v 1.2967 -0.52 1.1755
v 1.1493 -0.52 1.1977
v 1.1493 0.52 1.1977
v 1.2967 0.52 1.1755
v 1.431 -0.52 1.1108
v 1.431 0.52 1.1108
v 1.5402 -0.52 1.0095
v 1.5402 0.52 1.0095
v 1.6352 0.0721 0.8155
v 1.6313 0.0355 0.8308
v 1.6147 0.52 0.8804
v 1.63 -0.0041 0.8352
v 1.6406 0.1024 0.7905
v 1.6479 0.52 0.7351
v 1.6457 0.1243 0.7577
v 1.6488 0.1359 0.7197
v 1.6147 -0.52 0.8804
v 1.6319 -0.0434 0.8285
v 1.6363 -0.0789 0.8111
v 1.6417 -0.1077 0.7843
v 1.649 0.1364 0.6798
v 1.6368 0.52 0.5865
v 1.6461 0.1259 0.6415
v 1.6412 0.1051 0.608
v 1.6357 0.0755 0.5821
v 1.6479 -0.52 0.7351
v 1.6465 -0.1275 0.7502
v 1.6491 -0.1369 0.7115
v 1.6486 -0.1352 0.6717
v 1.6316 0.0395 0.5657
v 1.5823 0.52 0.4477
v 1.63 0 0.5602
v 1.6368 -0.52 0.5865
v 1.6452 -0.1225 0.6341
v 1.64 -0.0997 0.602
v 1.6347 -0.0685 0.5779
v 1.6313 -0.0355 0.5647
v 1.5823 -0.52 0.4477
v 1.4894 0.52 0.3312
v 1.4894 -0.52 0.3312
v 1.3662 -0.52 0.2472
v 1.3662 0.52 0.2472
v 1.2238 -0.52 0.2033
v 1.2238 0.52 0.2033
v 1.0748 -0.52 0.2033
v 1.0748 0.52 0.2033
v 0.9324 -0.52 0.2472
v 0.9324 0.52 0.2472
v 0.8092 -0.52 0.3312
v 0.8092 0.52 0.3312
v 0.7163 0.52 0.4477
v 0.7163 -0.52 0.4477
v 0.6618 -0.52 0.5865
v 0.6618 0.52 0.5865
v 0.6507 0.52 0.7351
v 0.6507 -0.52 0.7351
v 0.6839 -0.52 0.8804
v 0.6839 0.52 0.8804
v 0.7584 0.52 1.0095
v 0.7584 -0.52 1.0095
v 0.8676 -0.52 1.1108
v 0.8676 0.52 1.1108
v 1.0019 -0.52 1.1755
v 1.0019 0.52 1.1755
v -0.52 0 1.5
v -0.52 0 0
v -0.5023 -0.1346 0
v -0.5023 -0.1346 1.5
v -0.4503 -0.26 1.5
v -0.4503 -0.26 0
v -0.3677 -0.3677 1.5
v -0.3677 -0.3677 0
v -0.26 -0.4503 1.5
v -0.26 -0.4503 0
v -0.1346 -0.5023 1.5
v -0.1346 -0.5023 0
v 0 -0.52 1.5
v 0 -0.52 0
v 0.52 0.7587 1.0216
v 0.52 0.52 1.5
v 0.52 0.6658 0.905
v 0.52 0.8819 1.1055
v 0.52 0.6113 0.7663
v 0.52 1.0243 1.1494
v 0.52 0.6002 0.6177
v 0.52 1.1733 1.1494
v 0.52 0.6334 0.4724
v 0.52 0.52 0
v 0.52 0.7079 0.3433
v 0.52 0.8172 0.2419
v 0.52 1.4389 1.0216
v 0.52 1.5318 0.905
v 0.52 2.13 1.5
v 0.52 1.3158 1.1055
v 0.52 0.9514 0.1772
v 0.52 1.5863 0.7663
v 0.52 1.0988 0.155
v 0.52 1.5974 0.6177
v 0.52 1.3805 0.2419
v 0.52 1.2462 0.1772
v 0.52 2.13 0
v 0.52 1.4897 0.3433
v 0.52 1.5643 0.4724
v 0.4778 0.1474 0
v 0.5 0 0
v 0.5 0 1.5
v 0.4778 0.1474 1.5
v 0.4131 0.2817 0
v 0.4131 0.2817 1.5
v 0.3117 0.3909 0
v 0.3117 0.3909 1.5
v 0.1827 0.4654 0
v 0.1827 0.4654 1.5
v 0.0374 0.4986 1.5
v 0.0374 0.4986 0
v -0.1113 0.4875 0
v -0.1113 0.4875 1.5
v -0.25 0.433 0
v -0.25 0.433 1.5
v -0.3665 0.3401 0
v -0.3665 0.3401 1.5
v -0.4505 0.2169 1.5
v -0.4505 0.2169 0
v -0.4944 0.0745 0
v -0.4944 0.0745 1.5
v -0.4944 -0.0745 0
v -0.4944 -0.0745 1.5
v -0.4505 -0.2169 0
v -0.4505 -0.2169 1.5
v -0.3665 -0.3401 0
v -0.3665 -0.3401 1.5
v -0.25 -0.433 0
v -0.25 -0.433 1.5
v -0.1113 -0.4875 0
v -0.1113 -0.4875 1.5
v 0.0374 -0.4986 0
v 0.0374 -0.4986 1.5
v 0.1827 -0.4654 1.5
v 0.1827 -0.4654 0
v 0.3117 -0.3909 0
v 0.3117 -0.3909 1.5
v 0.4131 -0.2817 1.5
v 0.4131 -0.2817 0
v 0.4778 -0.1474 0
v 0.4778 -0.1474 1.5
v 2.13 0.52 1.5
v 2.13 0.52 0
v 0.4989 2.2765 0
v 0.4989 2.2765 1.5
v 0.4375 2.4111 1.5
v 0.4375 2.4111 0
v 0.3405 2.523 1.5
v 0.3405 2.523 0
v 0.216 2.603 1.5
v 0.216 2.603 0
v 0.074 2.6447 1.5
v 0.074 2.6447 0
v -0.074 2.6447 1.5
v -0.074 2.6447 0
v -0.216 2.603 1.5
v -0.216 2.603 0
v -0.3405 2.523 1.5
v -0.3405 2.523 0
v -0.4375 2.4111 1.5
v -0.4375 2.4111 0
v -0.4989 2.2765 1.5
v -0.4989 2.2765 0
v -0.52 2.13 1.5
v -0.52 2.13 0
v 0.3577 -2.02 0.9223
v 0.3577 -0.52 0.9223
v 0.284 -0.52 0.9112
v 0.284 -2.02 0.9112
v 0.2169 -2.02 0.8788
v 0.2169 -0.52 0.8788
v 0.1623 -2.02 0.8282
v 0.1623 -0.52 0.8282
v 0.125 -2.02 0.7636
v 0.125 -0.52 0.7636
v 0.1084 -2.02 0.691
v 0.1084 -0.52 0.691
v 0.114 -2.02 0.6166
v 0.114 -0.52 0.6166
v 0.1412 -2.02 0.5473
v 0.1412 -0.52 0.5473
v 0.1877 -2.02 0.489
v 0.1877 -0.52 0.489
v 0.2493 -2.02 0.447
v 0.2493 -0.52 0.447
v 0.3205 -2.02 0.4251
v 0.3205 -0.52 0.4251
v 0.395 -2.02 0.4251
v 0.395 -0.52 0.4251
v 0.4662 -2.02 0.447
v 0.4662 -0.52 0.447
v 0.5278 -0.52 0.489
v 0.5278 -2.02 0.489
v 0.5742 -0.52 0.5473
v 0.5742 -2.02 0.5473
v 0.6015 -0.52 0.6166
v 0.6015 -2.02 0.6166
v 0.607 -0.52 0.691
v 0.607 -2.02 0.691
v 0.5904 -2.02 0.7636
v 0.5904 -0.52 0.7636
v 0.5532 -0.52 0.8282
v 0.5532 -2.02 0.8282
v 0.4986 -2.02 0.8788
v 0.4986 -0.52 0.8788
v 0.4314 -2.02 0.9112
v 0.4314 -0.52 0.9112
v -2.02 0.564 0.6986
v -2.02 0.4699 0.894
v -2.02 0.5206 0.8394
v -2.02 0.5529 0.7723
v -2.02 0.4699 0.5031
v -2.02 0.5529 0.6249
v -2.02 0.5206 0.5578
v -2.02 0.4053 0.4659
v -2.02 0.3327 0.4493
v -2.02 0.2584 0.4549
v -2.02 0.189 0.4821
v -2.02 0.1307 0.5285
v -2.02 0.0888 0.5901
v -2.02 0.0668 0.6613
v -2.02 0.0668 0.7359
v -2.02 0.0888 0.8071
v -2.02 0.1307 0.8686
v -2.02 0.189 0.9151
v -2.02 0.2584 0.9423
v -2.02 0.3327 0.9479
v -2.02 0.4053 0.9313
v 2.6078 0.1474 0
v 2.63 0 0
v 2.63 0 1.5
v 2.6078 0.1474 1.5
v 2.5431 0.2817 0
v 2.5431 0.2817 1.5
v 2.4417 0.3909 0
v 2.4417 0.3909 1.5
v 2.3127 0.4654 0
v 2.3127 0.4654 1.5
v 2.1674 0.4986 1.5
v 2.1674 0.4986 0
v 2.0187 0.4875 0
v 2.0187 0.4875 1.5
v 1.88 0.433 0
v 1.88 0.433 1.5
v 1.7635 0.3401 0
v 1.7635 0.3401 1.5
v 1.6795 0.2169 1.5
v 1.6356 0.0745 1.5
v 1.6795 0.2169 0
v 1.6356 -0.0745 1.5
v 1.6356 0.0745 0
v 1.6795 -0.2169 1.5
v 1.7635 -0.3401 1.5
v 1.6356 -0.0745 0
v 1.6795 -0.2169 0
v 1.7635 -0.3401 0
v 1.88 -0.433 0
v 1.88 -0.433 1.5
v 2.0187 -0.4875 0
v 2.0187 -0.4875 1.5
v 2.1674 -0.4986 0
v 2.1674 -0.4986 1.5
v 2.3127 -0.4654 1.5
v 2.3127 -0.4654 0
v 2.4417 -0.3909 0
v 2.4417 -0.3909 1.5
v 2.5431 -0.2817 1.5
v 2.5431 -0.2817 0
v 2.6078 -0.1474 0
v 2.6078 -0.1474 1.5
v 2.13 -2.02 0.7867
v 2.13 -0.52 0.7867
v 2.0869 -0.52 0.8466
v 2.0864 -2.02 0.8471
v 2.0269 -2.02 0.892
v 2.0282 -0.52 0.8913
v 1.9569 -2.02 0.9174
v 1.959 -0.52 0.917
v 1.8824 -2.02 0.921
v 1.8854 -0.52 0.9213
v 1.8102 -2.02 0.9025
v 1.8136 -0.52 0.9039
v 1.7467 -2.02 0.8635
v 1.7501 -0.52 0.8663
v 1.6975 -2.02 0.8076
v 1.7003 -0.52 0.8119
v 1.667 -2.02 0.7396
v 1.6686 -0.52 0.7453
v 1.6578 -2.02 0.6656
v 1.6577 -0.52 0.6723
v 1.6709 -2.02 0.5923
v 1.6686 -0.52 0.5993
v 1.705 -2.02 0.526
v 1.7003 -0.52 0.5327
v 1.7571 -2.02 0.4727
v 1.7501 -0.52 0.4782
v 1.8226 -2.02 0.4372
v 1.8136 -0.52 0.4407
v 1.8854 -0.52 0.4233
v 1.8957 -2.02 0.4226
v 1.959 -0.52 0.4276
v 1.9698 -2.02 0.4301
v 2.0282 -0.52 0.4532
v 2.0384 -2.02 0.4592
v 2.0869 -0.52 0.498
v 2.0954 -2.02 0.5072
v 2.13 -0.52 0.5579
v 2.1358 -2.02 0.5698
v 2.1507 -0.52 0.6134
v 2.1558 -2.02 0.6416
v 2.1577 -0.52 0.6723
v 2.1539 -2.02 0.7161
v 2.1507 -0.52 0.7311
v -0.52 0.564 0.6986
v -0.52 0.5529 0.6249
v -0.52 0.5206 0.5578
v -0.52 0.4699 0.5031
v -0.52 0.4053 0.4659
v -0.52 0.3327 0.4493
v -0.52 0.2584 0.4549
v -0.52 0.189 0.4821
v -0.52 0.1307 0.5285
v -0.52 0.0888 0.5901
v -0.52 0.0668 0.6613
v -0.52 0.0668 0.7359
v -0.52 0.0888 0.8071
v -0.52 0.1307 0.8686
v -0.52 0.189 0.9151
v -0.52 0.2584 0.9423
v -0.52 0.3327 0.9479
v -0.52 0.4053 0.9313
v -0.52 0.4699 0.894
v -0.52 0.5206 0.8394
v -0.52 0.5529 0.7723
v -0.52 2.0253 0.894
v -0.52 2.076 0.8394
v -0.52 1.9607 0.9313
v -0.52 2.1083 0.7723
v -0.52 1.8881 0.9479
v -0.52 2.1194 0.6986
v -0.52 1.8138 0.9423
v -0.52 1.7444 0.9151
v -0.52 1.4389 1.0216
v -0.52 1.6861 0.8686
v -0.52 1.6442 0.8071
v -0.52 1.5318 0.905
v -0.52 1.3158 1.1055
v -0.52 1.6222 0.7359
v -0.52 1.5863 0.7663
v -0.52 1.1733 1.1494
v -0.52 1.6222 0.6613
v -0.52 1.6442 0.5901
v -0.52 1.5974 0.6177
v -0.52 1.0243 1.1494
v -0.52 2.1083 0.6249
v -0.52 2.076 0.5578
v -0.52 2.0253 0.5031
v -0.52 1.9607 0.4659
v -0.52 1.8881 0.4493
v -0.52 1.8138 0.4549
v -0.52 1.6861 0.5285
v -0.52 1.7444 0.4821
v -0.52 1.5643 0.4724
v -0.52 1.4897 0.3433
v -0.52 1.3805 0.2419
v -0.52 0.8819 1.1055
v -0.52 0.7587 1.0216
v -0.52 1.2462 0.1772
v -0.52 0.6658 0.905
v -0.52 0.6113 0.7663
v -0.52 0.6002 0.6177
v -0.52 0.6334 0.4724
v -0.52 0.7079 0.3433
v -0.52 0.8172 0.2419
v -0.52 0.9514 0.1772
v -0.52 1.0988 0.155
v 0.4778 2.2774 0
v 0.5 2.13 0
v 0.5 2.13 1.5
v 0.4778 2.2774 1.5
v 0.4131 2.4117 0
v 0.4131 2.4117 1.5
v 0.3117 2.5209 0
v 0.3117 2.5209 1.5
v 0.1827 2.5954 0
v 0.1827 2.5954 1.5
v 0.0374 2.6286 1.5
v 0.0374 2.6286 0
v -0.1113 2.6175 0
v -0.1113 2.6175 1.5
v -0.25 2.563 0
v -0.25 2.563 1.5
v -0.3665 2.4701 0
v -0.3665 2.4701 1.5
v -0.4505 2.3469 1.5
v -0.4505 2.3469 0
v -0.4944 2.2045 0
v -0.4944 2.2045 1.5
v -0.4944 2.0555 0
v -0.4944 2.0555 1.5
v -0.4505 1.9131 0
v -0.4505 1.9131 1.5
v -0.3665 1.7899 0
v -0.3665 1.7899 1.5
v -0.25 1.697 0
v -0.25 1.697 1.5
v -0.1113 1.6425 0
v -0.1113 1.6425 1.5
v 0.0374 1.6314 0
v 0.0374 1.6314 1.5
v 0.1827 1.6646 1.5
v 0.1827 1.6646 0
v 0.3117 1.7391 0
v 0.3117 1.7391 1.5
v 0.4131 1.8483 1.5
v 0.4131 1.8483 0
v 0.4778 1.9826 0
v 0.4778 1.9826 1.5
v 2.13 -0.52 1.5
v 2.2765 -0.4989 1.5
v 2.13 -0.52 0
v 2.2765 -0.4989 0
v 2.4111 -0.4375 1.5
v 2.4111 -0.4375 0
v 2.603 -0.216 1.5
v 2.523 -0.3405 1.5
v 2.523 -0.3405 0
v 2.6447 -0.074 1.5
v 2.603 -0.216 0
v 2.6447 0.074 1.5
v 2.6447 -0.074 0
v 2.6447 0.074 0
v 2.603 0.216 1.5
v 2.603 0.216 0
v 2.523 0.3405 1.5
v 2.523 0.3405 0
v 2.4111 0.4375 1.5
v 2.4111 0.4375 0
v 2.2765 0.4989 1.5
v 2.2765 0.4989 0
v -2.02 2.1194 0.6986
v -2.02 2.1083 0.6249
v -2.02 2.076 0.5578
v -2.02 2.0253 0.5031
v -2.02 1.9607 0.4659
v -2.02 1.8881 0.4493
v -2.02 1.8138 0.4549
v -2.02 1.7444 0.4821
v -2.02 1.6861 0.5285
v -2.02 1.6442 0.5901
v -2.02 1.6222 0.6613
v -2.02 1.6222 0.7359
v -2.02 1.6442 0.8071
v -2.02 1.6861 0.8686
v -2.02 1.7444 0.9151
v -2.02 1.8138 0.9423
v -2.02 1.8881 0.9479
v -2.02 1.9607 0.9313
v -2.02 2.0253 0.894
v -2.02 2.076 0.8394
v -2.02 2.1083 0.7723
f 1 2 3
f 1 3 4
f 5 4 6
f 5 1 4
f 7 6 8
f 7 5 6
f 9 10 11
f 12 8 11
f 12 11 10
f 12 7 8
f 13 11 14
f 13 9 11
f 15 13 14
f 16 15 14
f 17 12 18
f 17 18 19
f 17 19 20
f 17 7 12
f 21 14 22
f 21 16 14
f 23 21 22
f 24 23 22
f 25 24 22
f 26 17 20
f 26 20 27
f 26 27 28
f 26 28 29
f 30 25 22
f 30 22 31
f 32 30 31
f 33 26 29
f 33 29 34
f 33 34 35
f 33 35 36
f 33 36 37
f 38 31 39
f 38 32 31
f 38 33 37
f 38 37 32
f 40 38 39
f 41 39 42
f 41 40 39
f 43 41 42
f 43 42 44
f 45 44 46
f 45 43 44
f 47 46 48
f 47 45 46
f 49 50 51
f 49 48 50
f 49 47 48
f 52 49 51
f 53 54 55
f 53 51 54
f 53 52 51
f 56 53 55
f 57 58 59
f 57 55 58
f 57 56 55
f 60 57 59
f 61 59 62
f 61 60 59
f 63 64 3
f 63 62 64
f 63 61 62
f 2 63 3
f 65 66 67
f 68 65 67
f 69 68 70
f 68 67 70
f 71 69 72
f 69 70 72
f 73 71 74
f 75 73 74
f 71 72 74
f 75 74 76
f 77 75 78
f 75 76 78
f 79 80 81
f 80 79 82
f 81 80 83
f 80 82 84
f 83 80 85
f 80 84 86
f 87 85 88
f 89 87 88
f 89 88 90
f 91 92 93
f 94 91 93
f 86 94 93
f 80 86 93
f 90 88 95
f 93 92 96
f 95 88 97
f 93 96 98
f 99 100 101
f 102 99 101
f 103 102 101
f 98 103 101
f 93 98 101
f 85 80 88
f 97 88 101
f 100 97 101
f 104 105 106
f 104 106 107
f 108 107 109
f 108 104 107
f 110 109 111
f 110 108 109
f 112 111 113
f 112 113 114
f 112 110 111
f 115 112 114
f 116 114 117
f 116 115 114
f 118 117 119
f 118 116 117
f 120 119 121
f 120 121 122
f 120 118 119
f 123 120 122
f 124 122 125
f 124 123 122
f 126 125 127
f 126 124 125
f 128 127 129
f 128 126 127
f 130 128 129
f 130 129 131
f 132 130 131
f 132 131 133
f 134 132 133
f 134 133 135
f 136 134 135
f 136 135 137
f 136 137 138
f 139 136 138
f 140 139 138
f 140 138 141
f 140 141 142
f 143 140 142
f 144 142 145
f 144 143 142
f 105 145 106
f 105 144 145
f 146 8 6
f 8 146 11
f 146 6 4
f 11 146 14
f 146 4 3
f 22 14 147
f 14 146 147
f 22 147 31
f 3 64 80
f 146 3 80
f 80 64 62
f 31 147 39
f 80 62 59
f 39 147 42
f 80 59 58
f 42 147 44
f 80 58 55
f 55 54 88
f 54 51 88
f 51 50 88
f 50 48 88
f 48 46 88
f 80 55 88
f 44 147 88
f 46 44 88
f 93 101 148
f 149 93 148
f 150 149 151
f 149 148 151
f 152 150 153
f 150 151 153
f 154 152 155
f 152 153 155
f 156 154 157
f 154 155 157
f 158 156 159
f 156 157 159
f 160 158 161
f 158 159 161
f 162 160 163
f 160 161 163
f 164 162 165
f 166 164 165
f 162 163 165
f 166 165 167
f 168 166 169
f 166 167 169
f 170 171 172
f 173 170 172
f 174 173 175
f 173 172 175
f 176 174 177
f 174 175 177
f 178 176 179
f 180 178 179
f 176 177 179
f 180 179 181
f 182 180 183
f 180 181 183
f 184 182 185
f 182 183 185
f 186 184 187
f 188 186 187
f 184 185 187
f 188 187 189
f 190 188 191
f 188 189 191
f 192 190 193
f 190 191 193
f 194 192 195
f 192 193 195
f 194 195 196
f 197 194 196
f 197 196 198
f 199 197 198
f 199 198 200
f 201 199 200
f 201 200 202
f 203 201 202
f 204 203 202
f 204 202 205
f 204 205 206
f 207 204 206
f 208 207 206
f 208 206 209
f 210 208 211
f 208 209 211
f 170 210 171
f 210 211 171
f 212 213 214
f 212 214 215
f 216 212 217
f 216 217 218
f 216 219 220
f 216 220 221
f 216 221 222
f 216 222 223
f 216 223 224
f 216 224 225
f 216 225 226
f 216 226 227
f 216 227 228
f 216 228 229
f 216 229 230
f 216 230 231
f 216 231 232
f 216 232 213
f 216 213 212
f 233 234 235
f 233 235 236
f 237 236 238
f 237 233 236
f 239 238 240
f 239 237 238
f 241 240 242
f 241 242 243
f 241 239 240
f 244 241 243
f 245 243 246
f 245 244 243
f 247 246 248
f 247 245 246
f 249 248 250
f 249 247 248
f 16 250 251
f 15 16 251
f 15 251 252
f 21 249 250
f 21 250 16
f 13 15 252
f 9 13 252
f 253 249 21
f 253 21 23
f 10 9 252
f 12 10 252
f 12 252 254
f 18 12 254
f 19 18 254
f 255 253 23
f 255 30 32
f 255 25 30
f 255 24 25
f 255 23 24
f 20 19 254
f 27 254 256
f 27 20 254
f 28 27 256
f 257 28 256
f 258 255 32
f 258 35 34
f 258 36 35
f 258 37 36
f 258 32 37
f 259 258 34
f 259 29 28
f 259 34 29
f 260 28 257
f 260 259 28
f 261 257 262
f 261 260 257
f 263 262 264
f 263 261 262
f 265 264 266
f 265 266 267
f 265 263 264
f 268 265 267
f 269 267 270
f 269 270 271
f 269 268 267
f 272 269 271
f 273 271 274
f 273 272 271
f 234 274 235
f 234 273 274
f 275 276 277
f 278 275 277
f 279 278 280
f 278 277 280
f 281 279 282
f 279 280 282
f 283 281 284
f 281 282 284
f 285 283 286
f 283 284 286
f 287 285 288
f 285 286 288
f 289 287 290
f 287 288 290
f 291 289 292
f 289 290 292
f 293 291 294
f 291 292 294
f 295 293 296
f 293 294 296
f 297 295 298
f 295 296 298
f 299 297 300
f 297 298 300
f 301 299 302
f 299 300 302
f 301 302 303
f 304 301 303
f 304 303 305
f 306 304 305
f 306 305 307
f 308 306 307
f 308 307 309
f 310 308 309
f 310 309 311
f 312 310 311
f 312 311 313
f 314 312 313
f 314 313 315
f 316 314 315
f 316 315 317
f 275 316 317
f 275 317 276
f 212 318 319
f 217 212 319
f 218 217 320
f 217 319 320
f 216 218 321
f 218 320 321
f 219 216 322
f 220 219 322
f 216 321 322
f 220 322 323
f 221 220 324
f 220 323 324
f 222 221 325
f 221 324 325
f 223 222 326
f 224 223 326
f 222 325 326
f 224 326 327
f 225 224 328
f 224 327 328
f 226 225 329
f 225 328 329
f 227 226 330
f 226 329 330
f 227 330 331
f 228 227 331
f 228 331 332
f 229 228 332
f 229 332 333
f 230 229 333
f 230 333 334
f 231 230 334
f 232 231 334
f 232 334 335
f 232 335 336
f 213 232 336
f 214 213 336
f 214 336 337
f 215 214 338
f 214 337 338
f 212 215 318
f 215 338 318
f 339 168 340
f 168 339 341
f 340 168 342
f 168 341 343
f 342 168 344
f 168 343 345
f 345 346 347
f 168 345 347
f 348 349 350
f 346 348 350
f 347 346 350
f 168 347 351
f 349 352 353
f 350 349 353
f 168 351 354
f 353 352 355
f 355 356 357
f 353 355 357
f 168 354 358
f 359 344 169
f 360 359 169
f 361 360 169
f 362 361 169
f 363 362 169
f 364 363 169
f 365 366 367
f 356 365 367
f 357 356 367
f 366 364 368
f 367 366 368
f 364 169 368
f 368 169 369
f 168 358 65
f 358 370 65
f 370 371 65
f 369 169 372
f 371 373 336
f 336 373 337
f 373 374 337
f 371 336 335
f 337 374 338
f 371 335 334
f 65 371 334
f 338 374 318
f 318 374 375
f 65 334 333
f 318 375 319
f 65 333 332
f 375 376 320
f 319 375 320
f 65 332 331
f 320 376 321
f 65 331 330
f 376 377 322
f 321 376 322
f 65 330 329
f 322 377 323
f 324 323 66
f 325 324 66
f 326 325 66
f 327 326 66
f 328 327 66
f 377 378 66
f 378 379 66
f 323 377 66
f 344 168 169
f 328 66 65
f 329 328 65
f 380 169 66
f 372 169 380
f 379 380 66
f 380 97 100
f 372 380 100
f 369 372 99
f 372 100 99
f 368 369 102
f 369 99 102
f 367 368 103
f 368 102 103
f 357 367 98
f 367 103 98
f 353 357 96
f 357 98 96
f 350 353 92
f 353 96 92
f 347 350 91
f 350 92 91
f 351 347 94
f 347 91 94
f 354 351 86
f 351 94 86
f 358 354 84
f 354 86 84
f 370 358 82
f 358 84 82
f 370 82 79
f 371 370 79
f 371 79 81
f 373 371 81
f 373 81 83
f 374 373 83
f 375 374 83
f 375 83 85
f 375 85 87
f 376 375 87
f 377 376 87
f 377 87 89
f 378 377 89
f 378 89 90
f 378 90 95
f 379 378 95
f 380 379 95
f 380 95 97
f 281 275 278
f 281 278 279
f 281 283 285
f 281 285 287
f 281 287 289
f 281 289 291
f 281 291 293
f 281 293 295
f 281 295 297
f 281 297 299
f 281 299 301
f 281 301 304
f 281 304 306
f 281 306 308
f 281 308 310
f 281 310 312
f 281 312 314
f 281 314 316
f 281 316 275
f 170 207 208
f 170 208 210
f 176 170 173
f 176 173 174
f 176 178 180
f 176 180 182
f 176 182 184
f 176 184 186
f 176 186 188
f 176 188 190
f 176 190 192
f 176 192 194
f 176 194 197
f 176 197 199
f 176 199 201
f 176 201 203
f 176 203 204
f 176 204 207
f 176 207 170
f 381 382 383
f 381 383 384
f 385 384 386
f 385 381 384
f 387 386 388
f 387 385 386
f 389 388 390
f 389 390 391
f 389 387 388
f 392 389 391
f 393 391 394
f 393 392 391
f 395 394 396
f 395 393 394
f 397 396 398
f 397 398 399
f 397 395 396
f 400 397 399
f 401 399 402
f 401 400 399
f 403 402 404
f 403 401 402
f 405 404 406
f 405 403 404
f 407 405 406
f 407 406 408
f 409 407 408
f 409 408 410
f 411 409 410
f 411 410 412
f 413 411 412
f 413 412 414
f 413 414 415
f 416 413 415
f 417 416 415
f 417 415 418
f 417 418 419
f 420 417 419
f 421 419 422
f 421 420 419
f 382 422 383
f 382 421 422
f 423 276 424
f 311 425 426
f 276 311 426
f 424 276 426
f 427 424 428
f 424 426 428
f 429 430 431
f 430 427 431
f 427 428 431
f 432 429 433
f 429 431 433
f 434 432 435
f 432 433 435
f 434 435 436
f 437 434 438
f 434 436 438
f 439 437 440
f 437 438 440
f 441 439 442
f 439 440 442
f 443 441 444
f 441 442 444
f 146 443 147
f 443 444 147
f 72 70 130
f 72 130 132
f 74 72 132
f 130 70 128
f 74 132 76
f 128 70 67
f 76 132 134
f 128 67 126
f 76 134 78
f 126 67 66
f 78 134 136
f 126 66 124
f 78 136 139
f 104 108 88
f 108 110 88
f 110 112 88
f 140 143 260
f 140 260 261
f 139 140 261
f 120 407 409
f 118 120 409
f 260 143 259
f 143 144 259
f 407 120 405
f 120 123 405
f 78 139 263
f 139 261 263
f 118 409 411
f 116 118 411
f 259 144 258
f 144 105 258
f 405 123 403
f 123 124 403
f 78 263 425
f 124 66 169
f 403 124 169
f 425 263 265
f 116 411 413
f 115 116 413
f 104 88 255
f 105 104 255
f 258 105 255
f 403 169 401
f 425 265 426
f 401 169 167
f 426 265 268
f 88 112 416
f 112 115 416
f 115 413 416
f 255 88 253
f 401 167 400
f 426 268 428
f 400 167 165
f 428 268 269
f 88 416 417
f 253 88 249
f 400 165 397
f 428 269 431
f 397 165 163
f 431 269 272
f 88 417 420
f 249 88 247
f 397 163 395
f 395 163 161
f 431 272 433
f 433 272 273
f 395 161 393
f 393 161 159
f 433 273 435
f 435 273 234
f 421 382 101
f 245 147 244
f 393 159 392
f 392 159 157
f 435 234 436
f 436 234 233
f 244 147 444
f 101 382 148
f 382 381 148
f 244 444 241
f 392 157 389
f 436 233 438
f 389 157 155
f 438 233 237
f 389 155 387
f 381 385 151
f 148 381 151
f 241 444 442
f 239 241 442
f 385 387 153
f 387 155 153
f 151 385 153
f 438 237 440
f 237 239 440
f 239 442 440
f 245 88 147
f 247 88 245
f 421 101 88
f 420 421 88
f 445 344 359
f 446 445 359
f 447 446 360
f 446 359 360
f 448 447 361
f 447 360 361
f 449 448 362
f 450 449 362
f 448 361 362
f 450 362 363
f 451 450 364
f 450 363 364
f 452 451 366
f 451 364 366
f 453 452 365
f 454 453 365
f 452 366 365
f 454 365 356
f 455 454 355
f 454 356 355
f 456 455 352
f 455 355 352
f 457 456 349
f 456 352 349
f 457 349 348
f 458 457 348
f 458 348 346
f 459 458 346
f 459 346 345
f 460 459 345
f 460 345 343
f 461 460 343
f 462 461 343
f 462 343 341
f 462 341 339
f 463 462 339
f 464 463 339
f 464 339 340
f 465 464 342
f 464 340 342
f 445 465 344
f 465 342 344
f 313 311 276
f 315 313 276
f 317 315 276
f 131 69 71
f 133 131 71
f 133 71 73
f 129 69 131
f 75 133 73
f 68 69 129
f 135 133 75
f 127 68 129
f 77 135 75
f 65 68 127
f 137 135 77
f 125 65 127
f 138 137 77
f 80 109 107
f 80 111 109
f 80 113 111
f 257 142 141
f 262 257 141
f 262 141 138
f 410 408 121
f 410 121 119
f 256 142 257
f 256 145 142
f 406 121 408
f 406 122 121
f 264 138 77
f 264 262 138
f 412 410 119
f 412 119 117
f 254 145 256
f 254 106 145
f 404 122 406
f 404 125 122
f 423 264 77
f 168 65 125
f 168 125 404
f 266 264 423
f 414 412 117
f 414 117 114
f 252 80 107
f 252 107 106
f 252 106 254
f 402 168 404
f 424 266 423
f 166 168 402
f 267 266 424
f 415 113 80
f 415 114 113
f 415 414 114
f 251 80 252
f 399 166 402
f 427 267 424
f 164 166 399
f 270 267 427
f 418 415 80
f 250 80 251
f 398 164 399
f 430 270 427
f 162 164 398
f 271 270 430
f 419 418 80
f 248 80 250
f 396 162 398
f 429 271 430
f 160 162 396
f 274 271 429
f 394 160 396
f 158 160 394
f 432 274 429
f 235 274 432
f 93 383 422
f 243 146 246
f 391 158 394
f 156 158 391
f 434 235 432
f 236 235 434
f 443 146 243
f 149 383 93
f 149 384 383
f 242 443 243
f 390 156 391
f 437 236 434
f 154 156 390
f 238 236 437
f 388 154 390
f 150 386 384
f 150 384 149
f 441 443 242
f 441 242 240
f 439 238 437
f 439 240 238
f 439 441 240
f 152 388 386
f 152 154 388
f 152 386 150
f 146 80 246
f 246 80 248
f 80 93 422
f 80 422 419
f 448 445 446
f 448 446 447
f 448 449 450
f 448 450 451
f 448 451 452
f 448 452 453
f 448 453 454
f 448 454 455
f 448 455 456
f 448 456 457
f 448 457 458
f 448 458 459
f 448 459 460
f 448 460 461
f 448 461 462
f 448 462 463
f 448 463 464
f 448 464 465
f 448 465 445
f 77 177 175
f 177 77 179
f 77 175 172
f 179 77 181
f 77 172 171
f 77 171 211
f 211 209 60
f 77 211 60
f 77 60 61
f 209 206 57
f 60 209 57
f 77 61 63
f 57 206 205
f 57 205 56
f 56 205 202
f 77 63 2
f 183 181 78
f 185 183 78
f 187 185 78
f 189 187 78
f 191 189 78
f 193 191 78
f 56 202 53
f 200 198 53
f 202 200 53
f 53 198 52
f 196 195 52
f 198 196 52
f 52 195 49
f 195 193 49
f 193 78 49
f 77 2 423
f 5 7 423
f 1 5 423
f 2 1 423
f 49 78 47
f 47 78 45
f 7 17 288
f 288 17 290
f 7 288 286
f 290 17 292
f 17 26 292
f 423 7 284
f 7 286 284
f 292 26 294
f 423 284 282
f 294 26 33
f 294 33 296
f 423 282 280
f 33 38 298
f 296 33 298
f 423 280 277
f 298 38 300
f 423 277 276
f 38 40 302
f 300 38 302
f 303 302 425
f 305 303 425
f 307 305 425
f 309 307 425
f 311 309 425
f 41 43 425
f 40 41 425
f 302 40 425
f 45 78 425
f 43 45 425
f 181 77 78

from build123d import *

# Parameters (mm, degrees)
SKETCH1_R                = 0.52
SKETCH1_R_2              = 0.5
BOSS_EXTRUDE1_DEPTH      = 1.5
SKETCH2_R                = 0.5
CUT_EXTRUDE12_DEPTH      = 2
CUT_EXTRUDE14_DEPTH      = 4
CUT_EXTRUDE14_DEPTH_BACK = 2
SKETCH3_R                = 0.5
SKETCH5_R                = 0.25
BOSS_EXTRUDE2_DEPTH      = 1.5
SKETCH6_R                = 0.25
BOSS_EXTRUDE3_DEPTH      = 1.5


with BuildPart() as part:
    # Sketch1 → Boss-Extrude1 (new body)
    # profile 1 of 4: a face of its own
    with BuildSketch(Plane.XY):
        with BuildLine():
            ThreePointArc((0.52, 2.13), (0, 1.61), (-0.52, 2.13))
            Line((-0.52, 2.13), (-0.52, 0))
            ThreePointArc((-0.52, 0), (0, 0.52), (0.52, 0))
            ThreePointArc((0.52, 0), (0.367695526, -0.367695526), (0, -0.52))
            Line((0, -0.52), (2.13, -0.52))
            ThreePointArc((2.13, -0.52), (1.61, 0), (2.13, 0.52))
            Line((2.13, 0.52), (0.52, 0.52))
            Line((0.52, 0.52), (0.52, 2.13))
        make_face()
    # profile 2 of 4: a face of its own
    with BuildSketch(Plane.XY):
        with Locations((0, 2.13)):
            Circle(SKETCH1_R)
        with Locations((0, 2.13)):
            Circle(SKETCH1_R_2, mode=Mode.SUBTRACT)
    # profile 3 of 4: a face of its own
    with BuildSketch(Plane.XY):
        Circle(SKETCH1_R)
        Circle(SKETCH1_R_2, mode=Mode.SUBTRACT)
    # profile 4 of 4: a face of its own
    with BuildSketch(Plane.XY):
        with Locations((2.13, 0)):
            Circle(SKETCH1_R)
        with Locations((2.13, 0)):
            Circle(SKETCH1_R_2, mode=Mode.SUBTRACT)
    extrude(amount=BOSS_EXTRUDE1_DEPTH)

    # Sketch2 → Cut-Extrude12 (cut)
    with BuildSketch(Plane(origin=(0.52, 0, 0), x_dir=(0, 0, -1), z_dir=(1, 0, 0))):
        with Locations((-0.655033029, 1.098813184)):
            Circle(SKETCH2_R)
    extrude(amount=-CUT_EXTRUDE12_DEPTH, mode=Mode.SUBTRACT)

    # Sketch3 → Cut-Extrude14 (cut, two sides: drawn at the far end of the back side and taken through both)
    with BuildSketch(Plane(origin=(0, 0, 0), x_dir=(1, 0, 0), z_dir=(0, 1, 0)).offset(-CUT_EXTRUDE14_DEPTH_BACK)):
        with Locations(Location((1.149294437, -0.697720254, 0), (0, 0, 270))):
            Circle(SKETCH3_R)
    extrude(amount=CUT_EXTRUDE14_DEPTH + CUT_EXTRUDE14_DEPTH_BACK, mode=Mode.SUBTRACT)

    # Sketch5 → Boss-Extrude2 (add)
    with BuildSketch(Plane.ZY.offset(0.52)):
        with Locations(Location((0.698589711, 1.869412016, 0), (0, 0, 90))):
            Circle(SKETCH5_R)
        with Locations(Location((0.698589711, 0.313992931, 0), (0, 0, 90))):
            Circle(SKETCH5_R)
    extrude(amount=BOSS_EXTRUDE2_DEPTH)

    # Sketch6 → Boss-Extrude3 (add)
    with BuildSketch(Plane.XZ.offset(0.52)):
        with Locations(Location((1.90772148, 0.672279594, 0), (0, 0, 27.23786694))):
            Circle(SKETCH6_R)
        with Locations(Location((0.35772148, 0.672279594, 0), (0, 0, 90))):
            Circle(SKETCH6_R)
    extrude(amount=BOSS_EXTRUDE3_DEPTH)


solid = part.part
